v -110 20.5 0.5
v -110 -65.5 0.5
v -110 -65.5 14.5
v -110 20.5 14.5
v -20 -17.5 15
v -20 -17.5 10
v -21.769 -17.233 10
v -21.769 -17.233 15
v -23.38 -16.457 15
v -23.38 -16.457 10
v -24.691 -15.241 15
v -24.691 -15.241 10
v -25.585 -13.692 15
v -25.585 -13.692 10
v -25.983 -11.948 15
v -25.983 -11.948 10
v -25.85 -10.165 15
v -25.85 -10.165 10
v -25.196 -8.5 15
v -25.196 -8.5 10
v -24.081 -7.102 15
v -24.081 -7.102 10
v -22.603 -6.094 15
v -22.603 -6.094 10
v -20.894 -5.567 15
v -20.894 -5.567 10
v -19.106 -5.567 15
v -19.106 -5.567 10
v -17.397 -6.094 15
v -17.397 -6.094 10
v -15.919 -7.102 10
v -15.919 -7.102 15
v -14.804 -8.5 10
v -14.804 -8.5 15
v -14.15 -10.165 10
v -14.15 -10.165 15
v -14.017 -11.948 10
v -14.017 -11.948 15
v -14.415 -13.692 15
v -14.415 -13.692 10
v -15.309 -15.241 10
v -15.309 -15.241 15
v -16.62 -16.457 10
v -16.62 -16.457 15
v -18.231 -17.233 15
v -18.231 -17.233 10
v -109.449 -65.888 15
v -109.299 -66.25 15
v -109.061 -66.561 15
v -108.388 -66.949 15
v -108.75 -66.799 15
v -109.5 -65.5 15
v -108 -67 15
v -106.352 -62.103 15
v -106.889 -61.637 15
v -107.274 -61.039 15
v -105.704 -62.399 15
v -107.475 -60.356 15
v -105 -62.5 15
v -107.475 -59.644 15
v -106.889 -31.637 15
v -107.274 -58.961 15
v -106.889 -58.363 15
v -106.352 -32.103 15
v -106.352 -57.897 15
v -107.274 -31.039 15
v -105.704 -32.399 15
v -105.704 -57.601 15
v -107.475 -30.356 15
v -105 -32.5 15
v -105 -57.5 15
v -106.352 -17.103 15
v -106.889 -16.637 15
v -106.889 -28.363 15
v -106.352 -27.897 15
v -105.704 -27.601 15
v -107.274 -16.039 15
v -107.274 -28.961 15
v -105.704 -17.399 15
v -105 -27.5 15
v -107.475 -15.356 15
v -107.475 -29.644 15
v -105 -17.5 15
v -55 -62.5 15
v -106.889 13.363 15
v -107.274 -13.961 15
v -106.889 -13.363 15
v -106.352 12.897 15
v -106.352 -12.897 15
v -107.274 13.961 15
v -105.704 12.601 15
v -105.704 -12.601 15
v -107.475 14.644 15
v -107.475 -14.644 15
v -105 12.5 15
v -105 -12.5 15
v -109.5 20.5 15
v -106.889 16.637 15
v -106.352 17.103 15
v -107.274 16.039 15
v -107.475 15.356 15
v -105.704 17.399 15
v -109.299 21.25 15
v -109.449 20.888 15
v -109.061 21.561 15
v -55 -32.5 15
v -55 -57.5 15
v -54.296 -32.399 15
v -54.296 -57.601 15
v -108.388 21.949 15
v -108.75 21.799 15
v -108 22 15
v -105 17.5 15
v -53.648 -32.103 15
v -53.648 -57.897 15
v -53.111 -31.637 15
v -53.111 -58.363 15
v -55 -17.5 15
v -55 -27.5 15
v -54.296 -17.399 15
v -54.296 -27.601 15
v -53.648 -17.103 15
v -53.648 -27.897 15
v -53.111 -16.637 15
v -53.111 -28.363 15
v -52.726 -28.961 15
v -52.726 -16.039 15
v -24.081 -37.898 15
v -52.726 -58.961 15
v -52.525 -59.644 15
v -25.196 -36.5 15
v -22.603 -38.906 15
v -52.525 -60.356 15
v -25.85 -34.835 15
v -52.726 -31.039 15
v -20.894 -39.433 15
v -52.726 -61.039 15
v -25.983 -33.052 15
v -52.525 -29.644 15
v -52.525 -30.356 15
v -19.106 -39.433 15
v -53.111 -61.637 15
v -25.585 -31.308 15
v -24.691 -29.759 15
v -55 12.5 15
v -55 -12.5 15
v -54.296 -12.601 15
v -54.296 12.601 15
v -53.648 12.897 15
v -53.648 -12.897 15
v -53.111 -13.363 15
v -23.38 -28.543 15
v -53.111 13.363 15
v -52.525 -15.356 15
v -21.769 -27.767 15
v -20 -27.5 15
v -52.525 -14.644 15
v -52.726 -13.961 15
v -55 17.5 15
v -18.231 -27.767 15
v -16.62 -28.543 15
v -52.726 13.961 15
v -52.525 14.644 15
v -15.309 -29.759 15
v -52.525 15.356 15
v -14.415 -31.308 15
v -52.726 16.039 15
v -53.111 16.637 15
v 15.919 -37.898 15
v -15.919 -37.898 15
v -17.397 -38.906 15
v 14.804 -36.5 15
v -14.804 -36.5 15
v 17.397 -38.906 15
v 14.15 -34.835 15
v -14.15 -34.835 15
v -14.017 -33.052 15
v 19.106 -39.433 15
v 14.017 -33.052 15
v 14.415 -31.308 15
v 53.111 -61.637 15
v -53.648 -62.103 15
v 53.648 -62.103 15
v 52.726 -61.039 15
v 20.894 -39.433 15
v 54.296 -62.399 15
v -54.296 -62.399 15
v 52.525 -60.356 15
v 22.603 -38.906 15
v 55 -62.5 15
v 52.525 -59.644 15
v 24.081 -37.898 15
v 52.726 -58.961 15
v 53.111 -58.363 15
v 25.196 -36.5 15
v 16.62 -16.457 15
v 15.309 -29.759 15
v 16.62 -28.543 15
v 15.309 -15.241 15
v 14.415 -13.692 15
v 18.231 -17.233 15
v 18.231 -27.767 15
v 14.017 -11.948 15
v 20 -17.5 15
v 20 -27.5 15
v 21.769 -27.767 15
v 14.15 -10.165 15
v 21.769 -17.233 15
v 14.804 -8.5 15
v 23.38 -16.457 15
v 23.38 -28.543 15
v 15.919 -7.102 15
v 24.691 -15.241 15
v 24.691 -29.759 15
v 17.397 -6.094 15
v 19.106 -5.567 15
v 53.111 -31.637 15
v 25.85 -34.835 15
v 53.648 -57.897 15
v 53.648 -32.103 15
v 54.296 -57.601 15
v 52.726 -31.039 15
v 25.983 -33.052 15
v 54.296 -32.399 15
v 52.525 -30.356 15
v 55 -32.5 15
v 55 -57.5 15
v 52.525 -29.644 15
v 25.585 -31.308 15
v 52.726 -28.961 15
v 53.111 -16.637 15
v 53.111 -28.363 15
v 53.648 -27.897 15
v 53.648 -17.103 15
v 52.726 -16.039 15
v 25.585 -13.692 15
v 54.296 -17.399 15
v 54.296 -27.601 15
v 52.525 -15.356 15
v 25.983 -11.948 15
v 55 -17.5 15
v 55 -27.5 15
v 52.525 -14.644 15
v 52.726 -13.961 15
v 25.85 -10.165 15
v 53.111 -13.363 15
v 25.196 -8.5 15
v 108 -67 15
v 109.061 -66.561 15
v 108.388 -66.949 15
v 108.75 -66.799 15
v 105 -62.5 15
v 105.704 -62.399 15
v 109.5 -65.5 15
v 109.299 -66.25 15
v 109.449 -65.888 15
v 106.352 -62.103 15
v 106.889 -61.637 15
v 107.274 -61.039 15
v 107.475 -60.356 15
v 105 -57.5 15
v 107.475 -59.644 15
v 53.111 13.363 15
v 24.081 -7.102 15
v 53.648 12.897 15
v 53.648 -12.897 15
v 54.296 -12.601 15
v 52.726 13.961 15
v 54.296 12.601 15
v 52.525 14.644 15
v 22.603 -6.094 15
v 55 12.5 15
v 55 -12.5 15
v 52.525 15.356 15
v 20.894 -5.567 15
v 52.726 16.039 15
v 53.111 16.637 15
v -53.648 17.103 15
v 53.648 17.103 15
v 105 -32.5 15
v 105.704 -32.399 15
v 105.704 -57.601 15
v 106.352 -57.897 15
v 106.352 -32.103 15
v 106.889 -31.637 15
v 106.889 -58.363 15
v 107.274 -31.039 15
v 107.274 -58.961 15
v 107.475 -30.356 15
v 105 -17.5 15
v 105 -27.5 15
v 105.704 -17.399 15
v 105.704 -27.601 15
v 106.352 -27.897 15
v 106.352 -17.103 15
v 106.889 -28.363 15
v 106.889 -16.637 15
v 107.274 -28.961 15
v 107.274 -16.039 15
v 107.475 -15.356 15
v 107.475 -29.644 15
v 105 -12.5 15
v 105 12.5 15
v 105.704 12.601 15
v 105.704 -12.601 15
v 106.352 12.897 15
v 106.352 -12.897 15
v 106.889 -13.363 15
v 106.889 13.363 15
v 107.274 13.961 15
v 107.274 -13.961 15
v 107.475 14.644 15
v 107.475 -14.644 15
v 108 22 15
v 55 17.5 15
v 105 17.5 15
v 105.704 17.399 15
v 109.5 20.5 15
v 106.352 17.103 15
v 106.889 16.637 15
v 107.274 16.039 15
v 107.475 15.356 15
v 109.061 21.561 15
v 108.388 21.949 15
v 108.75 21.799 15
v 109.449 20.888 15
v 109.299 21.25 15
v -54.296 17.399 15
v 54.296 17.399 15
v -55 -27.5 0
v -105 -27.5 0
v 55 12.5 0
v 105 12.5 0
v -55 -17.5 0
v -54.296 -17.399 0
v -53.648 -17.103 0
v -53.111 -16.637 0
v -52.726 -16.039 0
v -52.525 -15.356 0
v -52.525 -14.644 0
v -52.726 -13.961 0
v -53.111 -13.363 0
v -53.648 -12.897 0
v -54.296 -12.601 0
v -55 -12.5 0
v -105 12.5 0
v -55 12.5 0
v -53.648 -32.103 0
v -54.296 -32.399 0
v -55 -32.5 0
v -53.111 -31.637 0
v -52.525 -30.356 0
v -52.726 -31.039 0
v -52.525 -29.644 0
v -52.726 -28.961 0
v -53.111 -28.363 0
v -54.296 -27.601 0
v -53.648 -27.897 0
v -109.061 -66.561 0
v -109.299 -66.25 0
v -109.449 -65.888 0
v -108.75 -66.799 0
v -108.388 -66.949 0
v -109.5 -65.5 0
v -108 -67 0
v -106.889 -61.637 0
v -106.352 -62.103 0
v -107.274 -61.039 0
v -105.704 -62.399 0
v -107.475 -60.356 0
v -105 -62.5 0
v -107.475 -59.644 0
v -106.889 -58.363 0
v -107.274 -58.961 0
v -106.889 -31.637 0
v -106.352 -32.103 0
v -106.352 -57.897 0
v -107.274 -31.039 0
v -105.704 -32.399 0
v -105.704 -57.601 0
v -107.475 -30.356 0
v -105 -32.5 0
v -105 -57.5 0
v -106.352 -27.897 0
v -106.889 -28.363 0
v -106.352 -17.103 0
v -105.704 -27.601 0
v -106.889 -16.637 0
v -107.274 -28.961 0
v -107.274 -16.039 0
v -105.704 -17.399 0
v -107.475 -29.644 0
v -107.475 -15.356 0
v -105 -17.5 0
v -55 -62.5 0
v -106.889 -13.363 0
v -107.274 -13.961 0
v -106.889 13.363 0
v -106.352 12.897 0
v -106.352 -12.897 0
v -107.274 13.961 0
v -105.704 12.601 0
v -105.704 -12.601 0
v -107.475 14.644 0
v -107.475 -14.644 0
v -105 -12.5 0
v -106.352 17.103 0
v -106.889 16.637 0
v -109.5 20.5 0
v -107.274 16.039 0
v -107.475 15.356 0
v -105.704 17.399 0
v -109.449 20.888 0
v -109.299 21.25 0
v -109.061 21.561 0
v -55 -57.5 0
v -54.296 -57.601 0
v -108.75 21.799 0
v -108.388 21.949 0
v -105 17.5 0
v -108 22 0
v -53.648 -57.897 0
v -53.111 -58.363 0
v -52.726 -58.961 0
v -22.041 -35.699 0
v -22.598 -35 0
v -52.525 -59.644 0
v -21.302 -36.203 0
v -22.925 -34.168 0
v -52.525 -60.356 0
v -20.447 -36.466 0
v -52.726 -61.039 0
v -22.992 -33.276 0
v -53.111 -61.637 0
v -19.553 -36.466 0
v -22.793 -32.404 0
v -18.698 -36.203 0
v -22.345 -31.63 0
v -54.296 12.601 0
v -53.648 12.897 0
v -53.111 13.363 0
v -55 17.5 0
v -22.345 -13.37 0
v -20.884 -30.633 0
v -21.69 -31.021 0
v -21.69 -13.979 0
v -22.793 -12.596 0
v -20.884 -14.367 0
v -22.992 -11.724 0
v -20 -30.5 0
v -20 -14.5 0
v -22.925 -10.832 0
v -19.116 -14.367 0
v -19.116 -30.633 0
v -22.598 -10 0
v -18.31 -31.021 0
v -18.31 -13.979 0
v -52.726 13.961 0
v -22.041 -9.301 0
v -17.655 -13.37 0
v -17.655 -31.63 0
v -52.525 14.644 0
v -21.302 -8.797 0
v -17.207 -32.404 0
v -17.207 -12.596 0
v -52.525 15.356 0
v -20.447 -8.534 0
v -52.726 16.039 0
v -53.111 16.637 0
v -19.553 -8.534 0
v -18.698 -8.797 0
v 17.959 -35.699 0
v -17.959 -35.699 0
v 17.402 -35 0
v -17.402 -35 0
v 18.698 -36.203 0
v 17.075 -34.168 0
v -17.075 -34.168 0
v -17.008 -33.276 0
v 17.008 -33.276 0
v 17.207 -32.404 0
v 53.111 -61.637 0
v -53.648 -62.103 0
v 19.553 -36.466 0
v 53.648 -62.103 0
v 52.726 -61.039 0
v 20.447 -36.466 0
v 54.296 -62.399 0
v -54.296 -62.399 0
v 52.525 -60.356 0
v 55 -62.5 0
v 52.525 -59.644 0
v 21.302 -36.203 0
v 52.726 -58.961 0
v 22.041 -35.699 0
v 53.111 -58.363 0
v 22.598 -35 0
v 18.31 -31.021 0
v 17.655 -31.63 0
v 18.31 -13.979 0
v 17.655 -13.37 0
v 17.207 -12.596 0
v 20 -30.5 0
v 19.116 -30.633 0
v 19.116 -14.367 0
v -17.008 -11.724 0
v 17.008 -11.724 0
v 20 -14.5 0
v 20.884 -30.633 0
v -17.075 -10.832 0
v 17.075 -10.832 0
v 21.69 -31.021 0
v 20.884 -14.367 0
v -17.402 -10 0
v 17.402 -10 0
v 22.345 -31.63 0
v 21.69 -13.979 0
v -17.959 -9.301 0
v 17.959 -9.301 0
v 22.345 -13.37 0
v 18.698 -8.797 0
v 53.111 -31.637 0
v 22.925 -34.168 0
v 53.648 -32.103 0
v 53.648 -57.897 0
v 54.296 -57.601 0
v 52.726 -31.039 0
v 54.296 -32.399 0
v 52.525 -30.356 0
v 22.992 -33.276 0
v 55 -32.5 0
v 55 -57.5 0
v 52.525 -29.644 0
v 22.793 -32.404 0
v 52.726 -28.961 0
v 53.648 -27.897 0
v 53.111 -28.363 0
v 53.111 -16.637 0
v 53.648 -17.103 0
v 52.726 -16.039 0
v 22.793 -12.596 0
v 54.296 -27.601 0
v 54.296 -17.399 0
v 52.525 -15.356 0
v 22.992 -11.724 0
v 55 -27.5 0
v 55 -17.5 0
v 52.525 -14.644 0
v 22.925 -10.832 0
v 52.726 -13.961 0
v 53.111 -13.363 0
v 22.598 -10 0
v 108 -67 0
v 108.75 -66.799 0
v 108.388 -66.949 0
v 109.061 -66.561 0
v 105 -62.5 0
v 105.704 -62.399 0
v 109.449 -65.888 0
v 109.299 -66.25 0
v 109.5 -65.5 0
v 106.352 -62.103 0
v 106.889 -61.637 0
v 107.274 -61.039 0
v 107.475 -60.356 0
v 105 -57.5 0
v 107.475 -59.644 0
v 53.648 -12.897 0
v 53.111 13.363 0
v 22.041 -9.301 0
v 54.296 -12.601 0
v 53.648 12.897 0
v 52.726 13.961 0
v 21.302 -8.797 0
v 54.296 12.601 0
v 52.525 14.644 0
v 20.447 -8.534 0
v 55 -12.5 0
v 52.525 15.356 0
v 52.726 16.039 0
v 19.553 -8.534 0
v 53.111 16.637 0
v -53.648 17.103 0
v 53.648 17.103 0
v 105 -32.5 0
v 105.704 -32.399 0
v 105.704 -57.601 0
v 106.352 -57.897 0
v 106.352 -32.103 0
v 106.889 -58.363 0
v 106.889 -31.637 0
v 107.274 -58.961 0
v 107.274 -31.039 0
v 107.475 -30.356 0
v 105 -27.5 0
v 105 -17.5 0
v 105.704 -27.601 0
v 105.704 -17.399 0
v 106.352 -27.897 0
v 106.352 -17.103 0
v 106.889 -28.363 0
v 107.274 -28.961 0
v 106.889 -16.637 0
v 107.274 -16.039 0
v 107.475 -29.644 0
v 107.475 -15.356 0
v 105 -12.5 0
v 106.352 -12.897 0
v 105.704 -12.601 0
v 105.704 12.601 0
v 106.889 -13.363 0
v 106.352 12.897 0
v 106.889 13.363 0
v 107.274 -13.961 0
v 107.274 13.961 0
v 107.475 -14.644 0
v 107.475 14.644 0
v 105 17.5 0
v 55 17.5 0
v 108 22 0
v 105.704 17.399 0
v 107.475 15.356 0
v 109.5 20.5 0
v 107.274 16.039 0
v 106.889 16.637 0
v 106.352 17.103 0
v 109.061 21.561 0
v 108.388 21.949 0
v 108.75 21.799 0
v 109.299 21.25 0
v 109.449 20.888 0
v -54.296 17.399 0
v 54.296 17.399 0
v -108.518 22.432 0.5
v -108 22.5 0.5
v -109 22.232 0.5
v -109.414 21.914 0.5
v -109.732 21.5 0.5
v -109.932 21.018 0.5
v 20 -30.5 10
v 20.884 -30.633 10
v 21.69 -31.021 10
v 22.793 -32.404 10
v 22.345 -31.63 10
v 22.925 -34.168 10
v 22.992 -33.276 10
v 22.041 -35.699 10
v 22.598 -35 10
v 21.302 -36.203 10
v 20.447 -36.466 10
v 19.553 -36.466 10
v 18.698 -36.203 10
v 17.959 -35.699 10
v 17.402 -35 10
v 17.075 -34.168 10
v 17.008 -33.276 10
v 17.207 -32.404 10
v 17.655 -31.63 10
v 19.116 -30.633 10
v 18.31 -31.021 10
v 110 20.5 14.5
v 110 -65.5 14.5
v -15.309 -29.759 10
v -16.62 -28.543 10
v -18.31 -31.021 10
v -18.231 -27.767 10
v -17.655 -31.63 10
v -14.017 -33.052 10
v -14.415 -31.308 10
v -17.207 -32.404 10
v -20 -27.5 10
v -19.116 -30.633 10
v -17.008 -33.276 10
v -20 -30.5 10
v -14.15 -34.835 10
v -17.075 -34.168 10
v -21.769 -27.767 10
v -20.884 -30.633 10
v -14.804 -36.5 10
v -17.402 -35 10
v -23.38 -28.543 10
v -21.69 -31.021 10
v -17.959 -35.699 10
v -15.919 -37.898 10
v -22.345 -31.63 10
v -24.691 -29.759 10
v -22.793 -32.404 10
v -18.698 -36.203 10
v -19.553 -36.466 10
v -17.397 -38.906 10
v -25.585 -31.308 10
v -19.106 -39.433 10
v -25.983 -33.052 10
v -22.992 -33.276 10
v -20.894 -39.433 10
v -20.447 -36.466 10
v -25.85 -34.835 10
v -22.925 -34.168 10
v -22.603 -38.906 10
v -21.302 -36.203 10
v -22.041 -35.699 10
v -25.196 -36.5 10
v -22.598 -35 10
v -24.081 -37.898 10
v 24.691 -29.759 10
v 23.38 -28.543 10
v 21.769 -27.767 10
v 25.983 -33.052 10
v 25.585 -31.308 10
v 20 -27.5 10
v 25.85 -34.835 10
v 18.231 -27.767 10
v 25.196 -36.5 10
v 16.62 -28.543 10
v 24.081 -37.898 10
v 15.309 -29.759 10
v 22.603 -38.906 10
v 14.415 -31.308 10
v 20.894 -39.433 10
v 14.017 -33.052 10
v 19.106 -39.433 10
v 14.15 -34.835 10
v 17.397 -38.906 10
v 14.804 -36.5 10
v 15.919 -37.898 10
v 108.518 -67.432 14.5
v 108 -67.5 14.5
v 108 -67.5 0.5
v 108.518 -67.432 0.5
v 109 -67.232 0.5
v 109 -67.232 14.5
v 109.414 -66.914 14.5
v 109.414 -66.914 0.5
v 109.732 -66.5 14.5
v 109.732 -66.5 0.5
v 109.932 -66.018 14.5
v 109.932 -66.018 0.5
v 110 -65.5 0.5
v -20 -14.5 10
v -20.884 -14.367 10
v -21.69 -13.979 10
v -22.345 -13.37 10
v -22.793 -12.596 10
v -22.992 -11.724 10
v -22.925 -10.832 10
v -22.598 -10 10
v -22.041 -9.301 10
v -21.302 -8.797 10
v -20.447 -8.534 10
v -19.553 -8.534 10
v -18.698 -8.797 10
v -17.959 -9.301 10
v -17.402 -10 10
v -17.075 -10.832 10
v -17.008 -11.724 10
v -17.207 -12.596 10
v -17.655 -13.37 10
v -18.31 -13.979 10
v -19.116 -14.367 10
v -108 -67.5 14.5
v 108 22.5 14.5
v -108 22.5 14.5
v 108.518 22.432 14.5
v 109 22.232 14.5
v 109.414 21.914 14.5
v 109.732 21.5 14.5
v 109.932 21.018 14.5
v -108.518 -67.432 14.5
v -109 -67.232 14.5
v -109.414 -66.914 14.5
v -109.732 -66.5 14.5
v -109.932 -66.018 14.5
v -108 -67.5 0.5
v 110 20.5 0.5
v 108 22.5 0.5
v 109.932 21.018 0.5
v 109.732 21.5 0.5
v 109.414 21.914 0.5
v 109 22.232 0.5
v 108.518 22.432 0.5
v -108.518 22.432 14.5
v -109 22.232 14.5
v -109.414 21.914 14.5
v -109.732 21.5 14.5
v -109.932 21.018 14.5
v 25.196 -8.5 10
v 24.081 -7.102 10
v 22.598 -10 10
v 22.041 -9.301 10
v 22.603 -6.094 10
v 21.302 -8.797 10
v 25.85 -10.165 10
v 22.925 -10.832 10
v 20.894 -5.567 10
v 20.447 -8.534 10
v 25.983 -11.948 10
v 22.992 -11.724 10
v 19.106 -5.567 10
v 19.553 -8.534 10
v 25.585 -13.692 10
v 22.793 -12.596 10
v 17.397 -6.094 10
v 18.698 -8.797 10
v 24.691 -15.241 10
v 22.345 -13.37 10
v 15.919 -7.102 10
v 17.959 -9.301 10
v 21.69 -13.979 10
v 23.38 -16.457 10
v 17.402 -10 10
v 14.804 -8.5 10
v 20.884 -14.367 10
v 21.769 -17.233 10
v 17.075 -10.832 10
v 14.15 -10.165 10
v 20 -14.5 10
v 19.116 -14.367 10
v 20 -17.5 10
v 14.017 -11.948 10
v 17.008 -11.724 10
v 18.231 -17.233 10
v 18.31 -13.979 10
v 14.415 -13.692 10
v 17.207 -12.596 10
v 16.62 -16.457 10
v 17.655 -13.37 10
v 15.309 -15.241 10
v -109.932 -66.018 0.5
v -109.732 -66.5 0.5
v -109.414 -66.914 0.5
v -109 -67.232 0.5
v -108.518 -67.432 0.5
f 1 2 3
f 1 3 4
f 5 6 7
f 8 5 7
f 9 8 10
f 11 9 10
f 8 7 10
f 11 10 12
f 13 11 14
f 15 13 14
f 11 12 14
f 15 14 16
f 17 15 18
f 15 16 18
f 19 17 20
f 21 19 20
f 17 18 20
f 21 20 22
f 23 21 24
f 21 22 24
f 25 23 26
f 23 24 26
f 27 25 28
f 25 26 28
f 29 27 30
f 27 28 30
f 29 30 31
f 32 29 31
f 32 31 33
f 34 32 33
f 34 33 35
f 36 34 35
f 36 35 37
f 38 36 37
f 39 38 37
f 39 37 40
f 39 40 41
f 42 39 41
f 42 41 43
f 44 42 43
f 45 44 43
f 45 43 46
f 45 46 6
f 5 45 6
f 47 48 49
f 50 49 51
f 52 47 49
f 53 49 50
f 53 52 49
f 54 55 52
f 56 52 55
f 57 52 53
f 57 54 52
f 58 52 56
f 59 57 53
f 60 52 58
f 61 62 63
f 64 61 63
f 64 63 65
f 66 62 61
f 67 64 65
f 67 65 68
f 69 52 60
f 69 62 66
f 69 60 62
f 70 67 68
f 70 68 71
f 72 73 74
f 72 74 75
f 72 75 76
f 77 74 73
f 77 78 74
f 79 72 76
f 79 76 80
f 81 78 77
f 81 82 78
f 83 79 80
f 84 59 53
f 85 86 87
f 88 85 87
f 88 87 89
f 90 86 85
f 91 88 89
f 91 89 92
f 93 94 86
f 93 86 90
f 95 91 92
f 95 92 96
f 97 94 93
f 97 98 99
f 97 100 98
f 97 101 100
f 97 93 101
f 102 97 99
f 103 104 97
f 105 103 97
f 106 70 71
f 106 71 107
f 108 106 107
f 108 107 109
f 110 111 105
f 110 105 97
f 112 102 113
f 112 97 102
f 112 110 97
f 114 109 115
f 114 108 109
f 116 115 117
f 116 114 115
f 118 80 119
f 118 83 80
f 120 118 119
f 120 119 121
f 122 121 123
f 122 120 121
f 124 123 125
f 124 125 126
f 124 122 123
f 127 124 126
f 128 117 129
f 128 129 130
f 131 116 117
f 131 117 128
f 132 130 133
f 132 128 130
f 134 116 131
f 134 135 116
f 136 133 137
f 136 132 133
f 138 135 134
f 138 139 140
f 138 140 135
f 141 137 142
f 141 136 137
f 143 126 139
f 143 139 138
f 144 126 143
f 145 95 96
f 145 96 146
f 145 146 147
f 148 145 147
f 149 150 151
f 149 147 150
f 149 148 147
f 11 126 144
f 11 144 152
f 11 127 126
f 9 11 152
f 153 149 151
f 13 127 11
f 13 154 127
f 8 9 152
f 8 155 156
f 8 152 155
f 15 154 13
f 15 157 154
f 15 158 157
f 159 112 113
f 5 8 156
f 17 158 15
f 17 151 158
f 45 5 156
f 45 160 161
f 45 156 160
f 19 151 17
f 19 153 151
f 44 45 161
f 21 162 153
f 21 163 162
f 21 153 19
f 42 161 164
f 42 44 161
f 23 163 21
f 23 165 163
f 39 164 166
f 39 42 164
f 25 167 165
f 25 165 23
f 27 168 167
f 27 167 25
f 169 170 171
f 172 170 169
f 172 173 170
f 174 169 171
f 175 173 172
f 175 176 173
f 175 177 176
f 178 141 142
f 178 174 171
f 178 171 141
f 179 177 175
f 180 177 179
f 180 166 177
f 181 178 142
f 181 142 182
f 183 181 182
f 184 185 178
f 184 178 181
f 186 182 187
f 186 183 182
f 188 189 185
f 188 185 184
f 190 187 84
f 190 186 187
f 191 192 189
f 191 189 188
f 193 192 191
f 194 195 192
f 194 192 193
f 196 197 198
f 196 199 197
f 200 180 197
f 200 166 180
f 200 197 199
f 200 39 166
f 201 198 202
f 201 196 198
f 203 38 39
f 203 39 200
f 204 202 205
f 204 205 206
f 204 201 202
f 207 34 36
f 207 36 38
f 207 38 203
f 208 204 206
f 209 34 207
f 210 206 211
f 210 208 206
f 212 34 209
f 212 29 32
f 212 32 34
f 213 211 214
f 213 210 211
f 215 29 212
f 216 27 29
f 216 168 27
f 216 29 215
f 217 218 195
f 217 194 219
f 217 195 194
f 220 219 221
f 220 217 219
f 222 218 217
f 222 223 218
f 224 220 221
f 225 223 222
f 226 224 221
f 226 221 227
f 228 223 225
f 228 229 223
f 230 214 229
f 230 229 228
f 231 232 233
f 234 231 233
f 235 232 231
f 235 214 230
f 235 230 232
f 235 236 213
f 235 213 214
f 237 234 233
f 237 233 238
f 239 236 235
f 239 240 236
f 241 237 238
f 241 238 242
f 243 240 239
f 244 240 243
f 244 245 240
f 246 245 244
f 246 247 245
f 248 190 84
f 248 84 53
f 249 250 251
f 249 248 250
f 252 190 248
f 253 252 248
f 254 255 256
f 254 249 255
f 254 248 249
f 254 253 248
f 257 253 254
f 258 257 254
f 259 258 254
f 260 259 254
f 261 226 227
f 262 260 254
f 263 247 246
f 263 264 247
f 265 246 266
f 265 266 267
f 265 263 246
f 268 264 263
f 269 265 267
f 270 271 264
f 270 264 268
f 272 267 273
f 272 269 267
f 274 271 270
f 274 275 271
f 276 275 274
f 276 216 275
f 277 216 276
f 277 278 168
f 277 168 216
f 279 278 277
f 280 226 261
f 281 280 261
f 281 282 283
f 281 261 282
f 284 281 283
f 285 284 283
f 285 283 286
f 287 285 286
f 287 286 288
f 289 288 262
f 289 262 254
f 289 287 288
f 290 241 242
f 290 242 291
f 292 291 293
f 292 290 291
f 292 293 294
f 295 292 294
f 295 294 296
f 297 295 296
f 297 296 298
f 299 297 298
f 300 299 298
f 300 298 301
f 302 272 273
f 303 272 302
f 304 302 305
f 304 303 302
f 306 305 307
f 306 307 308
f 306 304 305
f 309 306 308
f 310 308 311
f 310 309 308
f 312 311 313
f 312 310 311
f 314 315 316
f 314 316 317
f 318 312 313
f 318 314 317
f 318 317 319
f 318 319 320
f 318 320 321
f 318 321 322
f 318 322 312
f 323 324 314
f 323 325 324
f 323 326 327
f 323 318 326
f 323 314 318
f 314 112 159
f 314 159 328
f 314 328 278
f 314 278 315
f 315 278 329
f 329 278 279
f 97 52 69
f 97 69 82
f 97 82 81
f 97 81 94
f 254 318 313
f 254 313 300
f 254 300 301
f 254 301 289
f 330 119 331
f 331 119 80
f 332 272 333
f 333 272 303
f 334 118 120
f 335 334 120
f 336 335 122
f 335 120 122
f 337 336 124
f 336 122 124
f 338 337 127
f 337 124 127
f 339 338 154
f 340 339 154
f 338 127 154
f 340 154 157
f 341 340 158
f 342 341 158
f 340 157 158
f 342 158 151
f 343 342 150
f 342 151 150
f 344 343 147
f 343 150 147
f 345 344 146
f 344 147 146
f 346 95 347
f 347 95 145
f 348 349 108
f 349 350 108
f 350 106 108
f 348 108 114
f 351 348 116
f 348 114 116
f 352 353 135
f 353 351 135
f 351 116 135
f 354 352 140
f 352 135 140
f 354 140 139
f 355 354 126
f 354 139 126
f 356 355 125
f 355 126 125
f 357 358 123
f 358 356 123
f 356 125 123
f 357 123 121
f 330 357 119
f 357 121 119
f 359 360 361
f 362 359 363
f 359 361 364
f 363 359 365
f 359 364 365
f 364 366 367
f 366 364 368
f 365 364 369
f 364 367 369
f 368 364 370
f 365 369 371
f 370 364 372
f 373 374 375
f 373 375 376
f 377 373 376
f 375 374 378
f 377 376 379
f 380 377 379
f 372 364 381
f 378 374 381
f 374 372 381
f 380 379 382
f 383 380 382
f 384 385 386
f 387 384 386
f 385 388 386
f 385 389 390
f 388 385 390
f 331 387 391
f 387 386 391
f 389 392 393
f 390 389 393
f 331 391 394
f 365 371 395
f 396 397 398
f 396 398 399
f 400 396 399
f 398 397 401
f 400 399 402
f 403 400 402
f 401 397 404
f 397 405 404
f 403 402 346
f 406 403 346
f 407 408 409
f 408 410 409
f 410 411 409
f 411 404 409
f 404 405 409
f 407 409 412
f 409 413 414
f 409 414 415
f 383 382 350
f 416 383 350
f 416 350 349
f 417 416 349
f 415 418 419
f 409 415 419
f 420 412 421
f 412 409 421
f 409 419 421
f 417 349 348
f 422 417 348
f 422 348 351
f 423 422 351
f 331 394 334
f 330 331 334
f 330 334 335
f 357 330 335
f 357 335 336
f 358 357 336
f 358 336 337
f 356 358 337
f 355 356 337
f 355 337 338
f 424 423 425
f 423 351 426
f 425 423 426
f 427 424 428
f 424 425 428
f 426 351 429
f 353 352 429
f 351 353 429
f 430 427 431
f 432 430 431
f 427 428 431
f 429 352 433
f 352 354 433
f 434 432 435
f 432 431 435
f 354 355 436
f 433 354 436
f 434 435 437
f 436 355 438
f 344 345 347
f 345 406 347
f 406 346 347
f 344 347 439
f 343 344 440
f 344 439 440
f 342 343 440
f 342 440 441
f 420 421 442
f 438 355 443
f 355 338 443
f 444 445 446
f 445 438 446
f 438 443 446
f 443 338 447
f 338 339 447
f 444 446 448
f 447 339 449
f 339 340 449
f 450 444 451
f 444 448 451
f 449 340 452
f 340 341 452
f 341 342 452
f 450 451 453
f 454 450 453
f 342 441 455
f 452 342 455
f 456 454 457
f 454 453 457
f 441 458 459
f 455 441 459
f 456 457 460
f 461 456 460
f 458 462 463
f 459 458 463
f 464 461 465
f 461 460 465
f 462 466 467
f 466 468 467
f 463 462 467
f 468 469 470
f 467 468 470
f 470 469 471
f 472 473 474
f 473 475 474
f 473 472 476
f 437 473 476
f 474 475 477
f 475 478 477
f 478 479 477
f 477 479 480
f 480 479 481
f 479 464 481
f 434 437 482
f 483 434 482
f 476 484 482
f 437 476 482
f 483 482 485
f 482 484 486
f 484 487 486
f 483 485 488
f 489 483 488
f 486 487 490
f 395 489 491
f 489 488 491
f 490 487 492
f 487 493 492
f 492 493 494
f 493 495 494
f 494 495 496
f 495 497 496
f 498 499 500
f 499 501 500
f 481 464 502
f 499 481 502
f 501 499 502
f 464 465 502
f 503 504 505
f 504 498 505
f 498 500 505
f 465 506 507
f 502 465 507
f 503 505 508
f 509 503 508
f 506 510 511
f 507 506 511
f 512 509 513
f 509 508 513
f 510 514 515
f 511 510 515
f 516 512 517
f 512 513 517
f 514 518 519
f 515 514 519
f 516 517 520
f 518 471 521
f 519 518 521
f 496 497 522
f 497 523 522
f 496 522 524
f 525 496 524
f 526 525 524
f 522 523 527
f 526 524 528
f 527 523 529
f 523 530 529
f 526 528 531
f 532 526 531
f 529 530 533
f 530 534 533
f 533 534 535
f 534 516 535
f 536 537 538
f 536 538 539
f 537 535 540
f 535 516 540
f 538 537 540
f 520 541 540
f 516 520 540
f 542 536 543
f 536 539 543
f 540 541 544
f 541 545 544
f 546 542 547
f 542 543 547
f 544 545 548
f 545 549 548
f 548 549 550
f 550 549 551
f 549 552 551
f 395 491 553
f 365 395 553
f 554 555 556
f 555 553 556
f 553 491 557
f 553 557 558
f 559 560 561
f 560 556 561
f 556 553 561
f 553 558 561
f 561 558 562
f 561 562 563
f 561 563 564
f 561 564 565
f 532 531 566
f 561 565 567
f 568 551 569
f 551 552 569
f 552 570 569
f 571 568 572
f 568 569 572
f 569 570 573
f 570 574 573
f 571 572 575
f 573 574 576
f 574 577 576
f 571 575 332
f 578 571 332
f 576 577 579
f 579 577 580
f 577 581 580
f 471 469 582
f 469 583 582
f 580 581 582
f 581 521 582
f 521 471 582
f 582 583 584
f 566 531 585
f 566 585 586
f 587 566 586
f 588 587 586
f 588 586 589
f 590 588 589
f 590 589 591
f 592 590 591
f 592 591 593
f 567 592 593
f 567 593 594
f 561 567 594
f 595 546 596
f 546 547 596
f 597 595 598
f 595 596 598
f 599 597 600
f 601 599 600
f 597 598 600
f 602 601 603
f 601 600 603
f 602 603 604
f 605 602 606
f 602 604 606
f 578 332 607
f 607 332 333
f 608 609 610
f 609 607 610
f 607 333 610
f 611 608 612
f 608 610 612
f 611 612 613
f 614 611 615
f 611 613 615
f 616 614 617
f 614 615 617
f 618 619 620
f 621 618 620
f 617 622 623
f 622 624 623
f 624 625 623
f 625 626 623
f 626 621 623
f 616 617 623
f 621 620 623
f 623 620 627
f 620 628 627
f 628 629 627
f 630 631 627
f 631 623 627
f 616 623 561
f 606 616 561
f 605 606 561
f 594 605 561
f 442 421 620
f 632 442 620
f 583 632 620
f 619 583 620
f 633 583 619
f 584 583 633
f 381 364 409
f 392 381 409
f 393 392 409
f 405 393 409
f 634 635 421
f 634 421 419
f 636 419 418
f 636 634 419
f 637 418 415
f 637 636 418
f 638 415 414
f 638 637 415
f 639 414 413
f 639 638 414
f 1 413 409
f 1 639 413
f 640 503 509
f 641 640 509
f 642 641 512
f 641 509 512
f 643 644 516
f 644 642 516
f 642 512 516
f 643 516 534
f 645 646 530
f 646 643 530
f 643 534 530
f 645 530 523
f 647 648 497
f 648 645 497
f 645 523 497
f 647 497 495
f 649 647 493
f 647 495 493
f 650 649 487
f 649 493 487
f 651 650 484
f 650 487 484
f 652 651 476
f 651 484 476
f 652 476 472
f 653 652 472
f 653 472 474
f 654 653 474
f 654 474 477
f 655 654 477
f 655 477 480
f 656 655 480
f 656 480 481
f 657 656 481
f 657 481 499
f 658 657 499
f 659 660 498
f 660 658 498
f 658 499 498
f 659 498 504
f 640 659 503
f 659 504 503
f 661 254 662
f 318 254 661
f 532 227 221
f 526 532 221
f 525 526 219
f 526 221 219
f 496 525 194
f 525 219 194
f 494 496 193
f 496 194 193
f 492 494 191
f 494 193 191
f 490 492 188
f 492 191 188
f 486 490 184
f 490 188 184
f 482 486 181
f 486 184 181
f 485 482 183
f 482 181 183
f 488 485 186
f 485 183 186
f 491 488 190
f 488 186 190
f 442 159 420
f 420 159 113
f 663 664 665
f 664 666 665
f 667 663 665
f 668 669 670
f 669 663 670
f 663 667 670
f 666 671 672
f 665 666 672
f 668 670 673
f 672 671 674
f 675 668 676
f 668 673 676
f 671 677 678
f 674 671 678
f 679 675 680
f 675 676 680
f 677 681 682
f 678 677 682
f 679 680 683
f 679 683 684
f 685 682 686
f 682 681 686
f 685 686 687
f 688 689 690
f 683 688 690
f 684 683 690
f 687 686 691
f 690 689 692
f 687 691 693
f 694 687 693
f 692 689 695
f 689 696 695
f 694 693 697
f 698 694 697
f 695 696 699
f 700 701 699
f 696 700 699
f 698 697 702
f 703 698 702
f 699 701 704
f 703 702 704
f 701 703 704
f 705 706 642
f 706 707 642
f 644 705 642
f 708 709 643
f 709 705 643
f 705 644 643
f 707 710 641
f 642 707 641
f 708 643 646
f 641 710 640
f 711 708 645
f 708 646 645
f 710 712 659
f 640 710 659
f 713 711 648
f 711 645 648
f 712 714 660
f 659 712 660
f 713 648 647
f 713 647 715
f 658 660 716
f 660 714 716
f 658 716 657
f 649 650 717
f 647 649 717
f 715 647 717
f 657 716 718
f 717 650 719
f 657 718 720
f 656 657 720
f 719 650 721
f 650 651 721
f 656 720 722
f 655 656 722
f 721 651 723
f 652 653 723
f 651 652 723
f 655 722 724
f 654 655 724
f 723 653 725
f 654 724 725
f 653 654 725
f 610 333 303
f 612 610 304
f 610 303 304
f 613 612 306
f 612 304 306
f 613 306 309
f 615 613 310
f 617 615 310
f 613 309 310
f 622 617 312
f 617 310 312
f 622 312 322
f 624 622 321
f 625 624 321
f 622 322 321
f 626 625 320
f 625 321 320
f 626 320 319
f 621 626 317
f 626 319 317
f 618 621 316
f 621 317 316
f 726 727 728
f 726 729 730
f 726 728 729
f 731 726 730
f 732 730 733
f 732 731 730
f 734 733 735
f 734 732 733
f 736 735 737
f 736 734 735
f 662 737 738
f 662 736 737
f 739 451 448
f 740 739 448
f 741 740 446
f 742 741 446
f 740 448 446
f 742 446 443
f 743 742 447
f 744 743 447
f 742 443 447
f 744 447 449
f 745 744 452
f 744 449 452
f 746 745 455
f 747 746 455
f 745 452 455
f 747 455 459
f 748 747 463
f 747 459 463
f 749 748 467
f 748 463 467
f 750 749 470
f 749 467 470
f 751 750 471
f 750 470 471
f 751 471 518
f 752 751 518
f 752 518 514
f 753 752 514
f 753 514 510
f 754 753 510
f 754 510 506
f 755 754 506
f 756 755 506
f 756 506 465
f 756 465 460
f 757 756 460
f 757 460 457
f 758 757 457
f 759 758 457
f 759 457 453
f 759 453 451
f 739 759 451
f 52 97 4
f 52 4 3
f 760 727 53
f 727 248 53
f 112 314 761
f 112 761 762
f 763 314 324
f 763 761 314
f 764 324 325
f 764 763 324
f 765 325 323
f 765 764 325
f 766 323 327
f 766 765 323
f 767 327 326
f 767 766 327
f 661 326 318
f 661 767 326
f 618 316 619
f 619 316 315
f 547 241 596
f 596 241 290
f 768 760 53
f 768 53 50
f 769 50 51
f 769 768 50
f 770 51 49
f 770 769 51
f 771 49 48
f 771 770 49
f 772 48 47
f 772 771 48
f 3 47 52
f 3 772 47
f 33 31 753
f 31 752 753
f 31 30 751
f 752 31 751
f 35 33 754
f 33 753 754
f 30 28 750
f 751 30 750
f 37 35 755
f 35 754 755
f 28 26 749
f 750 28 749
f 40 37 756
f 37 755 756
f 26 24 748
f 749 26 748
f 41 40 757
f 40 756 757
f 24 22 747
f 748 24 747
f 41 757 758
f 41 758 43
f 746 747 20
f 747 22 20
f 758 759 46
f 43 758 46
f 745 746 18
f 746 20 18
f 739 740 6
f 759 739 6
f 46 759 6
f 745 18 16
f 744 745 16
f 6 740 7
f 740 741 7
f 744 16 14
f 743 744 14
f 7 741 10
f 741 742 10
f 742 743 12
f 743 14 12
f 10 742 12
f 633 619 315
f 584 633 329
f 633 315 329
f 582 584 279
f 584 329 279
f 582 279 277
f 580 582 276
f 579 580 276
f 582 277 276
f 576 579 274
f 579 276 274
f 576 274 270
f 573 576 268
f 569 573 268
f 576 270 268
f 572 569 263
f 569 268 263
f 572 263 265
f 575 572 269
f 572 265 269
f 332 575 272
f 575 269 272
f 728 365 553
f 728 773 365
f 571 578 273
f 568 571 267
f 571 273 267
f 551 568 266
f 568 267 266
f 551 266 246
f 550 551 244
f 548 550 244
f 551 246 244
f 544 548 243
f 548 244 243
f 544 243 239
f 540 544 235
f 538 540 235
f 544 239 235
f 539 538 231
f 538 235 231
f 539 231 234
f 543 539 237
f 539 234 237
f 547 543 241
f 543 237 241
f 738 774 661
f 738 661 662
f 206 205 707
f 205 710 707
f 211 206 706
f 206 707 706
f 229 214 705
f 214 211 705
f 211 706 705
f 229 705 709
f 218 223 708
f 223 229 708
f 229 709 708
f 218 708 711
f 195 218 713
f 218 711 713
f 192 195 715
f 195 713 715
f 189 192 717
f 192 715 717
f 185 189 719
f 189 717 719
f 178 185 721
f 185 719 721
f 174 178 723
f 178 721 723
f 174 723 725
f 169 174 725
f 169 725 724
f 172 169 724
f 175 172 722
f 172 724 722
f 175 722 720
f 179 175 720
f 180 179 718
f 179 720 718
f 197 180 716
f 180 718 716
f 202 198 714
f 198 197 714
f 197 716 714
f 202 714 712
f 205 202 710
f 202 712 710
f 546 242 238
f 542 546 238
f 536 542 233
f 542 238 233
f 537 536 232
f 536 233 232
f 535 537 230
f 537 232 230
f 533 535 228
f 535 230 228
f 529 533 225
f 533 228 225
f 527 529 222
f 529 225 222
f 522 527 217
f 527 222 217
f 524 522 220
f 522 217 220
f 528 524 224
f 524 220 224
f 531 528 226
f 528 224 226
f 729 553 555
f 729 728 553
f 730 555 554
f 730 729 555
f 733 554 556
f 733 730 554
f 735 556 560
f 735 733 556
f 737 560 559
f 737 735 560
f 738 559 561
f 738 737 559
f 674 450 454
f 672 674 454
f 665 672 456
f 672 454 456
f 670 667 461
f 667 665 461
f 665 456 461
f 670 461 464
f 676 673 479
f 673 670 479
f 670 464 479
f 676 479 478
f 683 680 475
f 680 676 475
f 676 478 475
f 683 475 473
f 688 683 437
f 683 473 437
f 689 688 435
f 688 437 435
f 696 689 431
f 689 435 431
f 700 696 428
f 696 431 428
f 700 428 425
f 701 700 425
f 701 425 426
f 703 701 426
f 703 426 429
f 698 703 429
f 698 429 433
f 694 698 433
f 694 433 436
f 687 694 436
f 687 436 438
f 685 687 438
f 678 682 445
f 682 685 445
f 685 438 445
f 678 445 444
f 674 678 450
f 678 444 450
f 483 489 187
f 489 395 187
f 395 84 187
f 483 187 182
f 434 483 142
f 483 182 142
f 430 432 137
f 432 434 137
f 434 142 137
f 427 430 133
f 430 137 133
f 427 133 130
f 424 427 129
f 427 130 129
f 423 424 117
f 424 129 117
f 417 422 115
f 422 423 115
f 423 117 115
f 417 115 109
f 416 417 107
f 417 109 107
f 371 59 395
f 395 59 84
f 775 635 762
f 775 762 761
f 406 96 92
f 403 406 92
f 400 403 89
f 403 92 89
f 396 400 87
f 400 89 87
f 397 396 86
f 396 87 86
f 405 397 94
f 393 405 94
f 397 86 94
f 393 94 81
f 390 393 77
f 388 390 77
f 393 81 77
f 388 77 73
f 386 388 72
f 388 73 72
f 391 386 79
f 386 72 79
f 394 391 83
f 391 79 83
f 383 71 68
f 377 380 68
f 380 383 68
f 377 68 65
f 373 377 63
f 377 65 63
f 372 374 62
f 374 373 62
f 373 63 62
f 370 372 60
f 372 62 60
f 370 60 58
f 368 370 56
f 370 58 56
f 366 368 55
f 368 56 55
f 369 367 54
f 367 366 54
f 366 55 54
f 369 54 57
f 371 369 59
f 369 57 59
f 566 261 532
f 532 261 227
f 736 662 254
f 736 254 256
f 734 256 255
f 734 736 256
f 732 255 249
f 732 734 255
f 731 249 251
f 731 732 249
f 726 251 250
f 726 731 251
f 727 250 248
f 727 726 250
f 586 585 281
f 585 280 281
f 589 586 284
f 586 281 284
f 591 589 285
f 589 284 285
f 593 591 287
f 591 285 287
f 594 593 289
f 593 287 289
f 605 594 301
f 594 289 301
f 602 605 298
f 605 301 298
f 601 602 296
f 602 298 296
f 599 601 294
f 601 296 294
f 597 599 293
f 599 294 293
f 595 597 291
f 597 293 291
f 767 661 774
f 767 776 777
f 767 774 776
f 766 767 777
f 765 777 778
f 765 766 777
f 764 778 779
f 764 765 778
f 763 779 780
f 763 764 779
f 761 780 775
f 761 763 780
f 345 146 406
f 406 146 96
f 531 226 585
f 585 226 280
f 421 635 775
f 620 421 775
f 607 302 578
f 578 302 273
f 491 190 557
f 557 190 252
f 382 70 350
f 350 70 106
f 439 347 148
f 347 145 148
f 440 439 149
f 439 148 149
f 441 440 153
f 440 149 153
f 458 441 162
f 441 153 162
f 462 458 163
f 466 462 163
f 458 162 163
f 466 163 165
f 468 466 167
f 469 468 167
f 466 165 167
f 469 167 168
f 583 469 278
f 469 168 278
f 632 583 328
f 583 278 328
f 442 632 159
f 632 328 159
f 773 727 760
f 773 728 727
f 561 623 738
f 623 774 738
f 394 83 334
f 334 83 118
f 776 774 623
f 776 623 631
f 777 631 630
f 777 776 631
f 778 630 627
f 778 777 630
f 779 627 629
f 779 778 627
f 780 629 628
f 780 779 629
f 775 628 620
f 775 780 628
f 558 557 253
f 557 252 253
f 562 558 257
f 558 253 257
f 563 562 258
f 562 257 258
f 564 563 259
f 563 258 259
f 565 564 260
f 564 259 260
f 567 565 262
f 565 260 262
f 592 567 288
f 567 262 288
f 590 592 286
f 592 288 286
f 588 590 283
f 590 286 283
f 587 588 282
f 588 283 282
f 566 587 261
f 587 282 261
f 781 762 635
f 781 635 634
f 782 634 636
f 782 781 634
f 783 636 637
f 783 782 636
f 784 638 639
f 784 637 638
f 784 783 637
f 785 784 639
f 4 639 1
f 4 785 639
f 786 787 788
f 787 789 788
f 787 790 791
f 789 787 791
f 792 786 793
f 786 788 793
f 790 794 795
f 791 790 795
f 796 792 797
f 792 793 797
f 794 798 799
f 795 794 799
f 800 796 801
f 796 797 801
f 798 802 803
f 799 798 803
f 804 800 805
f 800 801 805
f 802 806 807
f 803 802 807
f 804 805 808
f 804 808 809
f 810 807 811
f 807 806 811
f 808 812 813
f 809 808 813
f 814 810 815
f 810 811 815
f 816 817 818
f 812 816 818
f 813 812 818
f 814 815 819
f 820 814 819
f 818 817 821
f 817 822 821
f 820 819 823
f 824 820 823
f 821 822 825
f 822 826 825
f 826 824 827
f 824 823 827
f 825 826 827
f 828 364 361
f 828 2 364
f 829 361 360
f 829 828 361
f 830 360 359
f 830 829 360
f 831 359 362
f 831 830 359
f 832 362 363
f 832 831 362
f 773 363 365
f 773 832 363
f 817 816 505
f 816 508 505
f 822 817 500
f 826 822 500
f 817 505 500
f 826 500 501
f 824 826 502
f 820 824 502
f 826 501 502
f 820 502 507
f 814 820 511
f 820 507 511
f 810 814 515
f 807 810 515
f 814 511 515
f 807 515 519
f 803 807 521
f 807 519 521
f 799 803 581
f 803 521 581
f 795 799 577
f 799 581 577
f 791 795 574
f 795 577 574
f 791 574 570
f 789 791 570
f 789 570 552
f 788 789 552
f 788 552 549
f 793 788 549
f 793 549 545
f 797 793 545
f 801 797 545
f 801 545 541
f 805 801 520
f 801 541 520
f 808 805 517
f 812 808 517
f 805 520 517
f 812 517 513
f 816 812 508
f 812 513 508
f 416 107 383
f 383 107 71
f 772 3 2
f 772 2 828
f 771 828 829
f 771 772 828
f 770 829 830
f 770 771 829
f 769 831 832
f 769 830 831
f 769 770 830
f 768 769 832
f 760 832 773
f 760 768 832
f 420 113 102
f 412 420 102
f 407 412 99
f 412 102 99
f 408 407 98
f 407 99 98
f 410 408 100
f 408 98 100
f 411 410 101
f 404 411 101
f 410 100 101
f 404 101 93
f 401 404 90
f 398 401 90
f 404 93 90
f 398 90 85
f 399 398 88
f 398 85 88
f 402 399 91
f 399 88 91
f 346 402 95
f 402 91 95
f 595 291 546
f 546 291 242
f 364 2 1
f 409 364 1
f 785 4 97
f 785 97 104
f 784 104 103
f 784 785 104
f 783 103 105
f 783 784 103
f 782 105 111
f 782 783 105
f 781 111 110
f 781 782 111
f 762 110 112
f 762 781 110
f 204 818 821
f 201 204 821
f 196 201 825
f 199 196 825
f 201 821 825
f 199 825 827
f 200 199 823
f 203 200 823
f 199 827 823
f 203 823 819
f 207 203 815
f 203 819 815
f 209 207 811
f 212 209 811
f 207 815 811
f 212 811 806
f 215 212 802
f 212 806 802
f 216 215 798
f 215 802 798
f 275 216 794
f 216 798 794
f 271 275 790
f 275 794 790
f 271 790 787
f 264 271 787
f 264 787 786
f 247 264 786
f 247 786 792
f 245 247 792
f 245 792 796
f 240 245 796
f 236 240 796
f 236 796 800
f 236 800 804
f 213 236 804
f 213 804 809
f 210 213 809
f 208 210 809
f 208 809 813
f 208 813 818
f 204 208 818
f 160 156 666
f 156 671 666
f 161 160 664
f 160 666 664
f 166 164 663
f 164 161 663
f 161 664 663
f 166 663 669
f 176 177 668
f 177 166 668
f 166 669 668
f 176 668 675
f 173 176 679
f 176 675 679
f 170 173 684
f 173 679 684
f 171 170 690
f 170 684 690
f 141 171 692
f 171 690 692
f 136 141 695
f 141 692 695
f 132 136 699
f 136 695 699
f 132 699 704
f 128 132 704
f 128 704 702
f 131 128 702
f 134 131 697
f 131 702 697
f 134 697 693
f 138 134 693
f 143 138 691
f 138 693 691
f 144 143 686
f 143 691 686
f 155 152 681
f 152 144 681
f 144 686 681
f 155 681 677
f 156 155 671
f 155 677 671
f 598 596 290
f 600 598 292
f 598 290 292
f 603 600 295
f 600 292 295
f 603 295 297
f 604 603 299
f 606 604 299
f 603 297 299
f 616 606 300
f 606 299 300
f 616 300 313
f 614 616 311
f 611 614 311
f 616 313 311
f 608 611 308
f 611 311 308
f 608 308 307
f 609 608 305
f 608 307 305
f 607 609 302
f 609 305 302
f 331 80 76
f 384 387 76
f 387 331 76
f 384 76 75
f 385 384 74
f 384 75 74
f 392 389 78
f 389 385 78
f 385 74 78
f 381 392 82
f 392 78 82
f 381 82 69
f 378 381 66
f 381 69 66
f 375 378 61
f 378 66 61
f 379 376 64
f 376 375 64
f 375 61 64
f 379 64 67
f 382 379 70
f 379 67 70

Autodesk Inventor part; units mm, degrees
ref_plane "YZ Plane" through (0, 0, 0) normal (1, 0, 0) x (0, 1, 0)
ref_plane "XY Plane" through (0, 0, 0) normal (0, 0, 1) x (1, 0, 0)
sketch "Sketch1" plane through (0, 0, 0) normal (0, 0, 1) x (1, 0, 0)
  line L0 (-110, 22.5) -> (110, 22.5)
  line L1 (110, 22.5) -> (110, -22.5)
  line L2 (110, -22.5) -> (-110, -22.5)
  line L3 (-110, -22.5) -> (-110, 22.5)
  point P0 (0, 0)
  point P1 (110, 0)
  point P2 (0, 22.5)
  dimension "d0" = 220
  dimension "d1" = 45
extrude "Extrusion1" add sketch "Sketch1" along normal blind 15
sketch "Sketch2" plane through (0, 0, 15) normal (0, 0, 1) x (1, 0, 0)
  line L0 (-105, 15) -> (-55, 15) construction
  line L1 (-105, 12.5) -> (-55, 12.5)
  line L2 (-55, 17.5) -> (-105, 17.5)
  arc A0 (-105, 17.5) -> (-105, 12.5) centre (-105, 15) ccw
  arc A1 (-55, 12.5) -> (-55, 17.5) centre (-55, 15) ccw
  line L3 (-105, -15) -> (-55, -15) construction
  line L4 (-105, -17.5) -> (-55, -17.5)
  line L5 (-55, -12.5) -> (-105, -12.5)
  arc A2 (-105, -12.5) -> (-105, -17.5) centre (-105, -15) ccw
  arc A3 (-55, -17.5) -> (-55, -12.5) centre (-55, -15) ccw
  line L6 (-80, 15) -> (-80, -15) construction
  line L7 (-110, 22.5) -> (-110, -22.5) projected
  point P0 (0, 0)
  point P1 (-80, 0)
  dimension "d4" = 5
  dimension "d5" = 30
  dimension "d6" = 50
  dimension "d7" = 5
extrude "Extrusion2" cut sketch "Sketch2" against normal through all
mirror "Mirror1" about plane through (0, 0, 0) normal (1, 0, 0) of "Extrusion2"
fillet "Fillet1" [suppressed]
chamfer "Chamfer1" [suppressed]
sketch "Sketch3" plane through (0, 0, 15) normal (0, 0, -1) x (-1, 0, 0)
  line L0 (-20, -11.5) -> (20, -11.5) construction
  line L1 (-110, 22.5) -> (110, 22.5) projected
  line L2 (110, -22.5) -> (-110, -22.5) projected
  point P0 (0, 0)
  point P1 (0, -11.5)
  dimension "d14" = 40
  dimension "d28" = 11
hole "Hole1" at (20, -11.5, 15) at (-20, -11.5, 15) direction (0, 0, -1) diameter 6 end through all counterbore diameter 12 counterbore depth 5
ref_plane "Middle joining plane" through (0, -22.5, 0) normal (0, 1, 0) x (-1, 0, 0)
mirror "Double short side - join solid" about plane through (0, -22.5, 0) normal (0, 1, 0)
fillet "Double plate outer corners - R2" radius 2 4 edges at (110, -67.5, 7.5) (-110, -67.5, 7.5) (-110, 22.5, 7.5) (110, 22.5, 7.5)
chamfer "Double plate perimeter - 0.5 mm chamfer" distance 0.5 angle 45 12 edges at (109.4142, 21.9142, 15) (0, 22.5, 15) (-109.4142, 21.9142, 15) (-110, -22.5, 15) (0, -67.5, 15) (110, -22.5, 15) (109.4142, 21.9142, 0) (110, -22.5, 0) (0, -67.5, 0) (-110, -22.5, 0) (-109.4142, 21.9142, 0) (0, 22.5, 0)
equation "\"d28\" = bolts"
equation "\"bolts\" = 11"
properties part number "clamp-foot-double" material "Aluminum 6061"
